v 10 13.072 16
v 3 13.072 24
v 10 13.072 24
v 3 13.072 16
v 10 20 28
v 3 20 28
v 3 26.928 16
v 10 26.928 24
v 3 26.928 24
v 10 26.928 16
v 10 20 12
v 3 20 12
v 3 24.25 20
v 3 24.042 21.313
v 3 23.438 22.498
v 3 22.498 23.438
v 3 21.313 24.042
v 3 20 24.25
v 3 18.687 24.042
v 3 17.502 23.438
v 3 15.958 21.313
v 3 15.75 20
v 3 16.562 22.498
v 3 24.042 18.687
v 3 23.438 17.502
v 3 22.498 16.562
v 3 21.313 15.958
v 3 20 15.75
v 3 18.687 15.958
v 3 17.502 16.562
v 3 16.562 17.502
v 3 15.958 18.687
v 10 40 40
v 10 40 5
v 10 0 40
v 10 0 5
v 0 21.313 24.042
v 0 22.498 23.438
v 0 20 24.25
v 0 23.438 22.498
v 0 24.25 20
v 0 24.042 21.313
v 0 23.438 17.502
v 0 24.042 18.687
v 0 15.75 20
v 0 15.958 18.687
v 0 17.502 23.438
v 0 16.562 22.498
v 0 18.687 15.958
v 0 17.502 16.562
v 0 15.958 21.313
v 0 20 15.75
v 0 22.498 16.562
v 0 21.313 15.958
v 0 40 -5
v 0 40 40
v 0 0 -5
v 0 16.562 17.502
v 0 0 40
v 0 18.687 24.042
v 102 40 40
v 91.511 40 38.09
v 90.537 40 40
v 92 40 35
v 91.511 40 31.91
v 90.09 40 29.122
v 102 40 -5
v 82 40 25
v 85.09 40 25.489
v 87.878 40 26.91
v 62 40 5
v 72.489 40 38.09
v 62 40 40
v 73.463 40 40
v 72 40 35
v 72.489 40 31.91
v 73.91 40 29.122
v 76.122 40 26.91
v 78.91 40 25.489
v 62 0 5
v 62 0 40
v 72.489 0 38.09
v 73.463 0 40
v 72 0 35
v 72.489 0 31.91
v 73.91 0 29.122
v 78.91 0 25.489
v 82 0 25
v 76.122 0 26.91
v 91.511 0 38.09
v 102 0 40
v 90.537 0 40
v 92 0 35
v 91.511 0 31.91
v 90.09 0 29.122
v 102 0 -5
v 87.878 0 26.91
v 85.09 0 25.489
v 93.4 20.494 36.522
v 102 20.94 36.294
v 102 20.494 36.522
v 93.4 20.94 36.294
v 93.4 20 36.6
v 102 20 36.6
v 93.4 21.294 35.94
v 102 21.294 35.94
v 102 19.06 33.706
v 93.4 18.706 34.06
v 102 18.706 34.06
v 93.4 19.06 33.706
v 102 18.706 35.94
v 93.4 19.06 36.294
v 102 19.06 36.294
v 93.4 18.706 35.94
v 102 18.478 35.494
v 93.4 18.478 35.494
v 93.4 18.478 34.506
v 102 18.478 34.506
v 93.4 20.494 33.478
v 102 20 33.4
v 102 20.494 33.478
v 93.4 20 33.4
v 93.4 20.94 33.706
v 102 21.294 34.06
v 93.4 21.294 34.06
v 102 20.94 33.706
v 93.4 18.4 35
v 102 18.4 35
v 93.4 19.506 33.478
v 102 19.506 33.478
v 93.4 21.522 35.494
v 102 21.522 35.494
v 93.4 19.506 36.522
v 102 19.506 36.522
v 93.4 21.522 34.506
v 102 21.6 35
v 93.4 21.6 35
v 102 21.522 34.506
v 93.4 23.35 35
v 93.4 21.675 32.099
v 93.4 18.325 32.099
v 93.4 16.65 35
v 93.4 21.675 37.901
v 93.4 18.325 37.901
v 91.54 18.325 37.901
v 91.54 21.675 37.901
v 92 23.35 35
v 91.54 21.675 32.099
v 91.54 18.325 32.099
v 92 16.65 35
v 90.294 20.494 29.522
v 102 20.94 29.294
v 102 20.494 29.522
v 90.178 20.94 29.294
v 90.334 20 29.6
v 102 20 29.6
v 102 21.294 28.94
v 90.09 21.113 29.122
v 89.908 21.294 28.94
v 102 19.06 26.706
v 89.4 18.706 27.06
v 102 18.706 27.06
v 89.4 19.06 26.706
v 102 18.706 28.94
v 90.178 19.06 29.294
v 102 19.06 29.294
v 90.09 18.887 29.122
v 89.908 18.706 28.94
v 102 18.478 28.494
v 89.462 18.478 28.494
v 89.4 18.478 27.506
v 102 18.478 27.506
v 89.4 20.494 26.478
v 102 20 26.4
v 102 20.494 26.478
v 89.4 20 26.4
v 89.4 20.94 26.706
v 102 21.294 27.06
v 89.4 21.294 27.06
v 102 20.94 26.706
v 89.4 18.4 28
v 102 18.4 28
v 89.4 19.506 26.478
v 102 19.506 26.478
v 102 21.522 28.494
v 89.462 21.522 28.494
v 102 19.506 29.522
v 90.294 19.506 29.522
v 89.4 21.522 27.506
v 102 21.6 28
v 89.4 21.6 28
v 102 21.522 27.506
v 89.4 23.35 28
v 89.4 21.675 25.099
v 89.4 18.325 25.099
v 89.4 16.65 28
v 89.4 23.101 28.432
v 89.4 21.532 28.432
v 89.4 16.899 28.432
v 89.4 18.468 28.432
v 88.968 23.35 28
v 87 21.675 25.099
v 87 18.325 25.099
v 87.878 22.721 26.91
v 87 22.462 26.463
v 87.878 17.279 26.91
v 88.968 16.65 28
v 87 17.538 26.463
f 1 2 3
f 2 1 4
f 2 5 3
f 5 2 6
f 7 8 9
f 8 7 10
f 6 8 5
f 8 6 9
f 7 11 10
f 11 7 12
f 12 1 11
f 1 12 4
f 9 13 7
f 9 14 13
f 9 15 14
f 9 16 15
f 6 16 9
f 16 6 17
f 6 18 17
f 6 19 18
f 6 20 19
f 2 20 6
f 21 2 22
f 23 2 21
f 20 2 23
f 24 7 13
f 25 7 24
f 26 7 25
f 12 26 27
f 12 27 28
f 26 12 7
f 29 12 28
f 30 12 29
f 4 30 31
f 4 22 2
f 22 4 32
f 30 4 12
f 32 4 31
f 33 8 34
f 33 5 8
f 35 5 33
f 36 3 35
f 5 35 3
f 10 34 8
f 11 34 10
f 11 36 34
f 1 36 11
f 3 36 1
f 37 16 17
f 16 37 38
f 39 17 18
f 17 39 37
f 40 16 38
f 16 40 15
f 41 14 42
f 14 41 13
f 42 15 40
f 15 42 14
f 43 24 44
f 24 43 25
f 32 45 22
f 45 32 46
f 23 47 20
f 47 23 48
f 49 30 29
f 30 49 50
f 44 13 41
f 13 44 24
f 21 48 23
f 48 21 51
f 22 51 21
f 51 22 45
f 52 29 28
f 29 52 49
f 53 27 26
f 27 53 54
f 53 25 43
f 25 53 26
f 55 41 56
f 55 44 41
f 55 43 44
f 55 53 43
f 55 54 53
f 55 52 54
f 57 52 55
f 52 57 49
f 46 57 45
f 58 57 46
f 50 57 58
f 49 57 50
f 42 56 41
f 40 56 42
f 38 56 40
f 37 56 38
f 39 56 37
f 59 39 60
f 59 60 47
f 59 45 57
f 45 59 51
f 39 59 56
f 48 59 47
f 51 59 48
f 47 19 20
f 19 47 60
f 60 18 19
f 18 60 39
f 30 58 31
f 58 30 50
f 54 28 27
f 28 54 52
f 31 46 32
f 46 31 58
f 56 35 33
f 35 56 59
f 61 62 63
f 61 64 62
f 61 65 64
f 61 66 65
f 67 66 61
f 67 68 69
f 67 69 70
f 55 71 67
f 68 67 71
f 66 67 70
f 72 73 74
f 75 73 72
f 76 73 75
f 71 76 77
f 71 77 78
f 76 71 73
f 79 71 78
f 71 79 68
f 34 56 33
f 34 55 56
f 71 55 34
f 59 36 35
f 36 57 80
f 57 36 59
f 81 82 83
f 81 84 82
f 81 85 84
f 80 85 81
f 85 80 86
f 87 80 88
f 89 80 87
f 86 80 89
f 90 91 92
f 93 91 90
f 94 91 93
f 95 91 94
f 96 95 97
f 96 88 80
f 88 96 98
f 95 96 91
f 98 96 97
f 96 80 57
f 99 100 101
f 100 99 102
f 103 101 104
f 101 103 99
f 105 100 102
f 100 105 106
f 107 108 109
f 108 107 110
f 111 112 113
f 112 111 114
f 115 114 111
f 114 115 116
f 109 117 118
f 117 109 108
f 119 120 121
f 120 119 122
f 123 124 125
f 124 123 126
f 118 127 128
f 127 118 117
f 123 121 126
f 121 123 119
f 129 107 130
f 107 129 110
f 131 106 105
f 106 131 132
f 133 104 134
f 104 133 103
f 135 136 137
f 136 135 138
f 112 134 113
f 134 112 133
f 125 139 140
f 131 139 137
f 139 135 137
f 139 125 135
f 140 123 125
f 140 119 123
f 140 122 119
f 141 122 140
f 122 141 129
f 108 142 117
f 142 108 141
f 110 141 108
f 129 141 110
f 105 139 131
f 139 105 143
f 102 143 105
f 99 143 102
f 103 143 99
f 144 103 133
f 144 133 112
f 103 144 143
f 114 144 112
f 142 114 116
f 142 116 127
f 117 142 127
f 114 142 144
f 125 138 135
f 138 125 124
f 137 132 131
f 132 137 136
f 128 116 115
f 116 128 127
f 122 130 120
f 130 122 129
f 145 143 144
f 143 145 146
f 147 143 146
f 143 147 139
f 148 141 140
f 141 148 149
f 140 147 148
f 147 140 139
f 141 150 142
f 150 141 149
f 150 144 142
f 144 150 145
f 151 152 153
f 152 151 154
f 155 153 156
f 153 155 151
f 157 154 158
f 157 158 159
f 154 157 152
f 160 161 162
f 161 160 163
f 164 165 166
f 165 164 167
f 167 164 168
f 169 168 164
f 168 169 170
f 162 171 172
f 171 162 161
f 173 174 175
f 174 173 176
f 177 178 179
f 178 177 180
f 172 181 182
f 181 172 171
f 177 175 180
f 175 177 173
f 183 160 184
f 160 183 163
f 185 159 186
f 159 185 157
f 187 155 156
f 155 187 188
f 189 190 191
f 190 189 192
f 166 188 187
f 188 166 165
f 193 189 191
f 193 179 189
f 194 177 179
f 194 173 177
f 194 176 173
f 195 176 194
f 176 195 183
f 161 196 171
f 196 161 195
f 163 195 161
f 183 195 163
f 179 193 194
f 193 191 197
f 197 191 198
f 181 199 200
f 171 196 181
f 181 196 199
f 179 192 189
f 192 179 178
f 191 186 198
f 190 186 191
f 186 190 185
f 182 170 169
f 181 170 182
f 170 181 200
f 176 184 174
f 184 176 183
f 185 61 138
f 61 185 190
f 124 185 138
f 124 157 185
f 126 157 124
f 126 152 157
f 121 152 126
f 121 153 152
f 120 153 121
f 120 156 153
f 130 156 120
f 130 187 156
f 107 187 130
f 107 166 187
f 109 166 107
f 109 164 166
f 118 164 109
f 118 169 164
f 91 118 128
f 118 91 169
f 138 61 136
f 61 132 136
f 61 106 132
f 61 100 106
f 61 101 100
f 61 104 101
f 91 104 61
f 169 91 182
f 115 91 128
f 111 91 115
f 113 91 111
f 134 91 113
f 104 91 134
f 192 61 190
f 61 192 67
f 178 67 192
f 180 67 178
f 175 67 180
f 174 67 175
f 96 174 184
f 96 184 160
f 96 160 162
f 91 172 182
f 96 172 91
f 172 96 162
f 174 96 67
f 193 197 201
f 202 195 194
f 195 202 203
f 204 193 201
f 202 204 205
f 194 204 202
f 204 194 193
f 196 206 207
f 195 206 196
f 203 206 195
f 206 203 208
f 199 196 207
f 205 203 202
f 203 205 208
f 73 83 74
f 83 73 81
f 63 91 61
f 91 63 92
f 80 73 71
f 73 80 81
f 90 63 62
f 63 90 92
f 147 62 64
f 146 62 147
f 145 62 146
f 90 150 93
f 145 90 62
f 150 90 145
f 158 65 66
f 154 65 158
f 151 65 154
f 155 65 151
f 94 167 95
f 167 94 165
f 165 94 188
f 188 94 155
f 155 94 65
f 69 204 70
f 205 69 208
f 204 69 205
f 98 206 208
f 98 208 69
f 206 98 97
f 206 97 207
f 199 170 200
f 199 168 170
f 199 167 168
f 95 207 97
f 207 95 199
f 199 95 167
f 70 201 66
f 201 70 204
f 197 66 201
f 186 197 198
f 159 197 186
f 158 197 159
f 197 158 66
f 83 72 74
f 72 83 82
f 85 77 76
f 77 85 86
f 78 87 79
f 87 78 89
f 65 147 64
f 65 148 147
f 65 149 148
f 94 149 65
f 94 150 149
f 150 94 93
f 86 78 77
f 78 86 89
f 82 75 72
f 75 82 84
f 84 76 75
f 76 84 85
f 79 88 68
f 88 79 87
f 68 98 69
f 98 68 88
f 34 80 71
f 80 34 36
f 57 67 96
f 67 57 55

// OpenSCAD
// file: ../libs/hardware-recess.scad
/*
 * A library to make capture holes in material for M3 & M5 hardware and some
 * common mounting patterns.
 * Copyright 2021 Alex Volkov <alex@flamy.ca>
 *
 * Project URL
 * https://github.com/avolkov/openscad-designs
 *
 * License: Attribution-ShareAlike 4.0 International (CC BY-SA)
 * https://creativecommons.org/licenses/by-sa/4.0/
 *
 * Version 0.1 2021-04-05 Initial publication
 */

 // Common mounting patterns
ear_thick=8;
stacked_len = ear_thick*3;
screw_mount_space = 20;
screw_mount_offset =7;
total_len = stacked_len + screw_mount_space*2;
mounting_diff = 8;


//Globals for hardware diameters
M3_THREAD_RAD = 1.5;
M5_THREAD_RAD = 2.6;


m3_nut_trap_d = 6.7;
m3_nut_thick= 2.4;

//M3 fastener values
m3_bolt_head_d = 5.6;
m3_bolt_thick = 3.2;

//M5 fastener values
m5_nut_thick = 4;
m5_locknut_thick = 5;
nut_trap_d = 9.7;
bolt_head_d = 8.6;
m5_bolt_head_d = bolt_head_d;


module bolt_nut(hole_len, bolt_d, flip=false){
    /*
    Create a model for a hole with bolt end on one end and nut hole on the other end.
    Note, this functions doesn't subtract the model it only makes the model

    :hole_len: total length of the hole
    :bolt_d: diameter of a blot
    :flip: flip the side with bolt recess
    */
    // currently only implemented for 3mm
    if (flip){
        hole_w_end(hole_len, m3_nut_thick, "hex", bolt_d);
        translate([0,0, hole_len]){
            rotate([180, 0, 0]){
                hole_w_end(hole_len, m3_bolt_thick, "round", bolt_d);
            }
        }
    } else {
        hole_w_end(hole_len, m3_bolt_thick, "round", bolt_d);
        translate([0,0, hole_len]){
            rotate([180, 0, 0]){
                hole_w_end(hole_len, m3_nut_thick, "hex", bolt_d);
            }
        }
    }
}


module hole_w_end(hole_len, trap_height, type, bolt_d, flip=false){
    /*
    Make a hole with an end for bolt or a nut.
    This is a more generic functions replacing m5_ hole-making functions.

    :bolt_d: bolt diameter, i.e. 3, 5 mm
    :type: type of the head hole: 'none', 'hex', 'round
    */
    if (type != "none"){
        cylinder(h=hole_len-trap_height, d=bolt_d, $fn=20);
        if (flip){
            m_recess(trap_height, type, bolt_d);
            translate([0,0,trap_height])
                cylinder(h=hole_len-trap_height, d=bolt_d, $fn=20);

        } else {
                translate([0,0, hole_len - trap_height])
                    m_recess(trap_height, type, bolt_d);
        }
    } else {
        cylinder(h=hole_len, d=bolt_d);
    }
}

module m_recess(length, end_type, bolt_d) {
    /*
    Create nut or bolt capture hole

    :height: length of a mounting hole, including end-mounting hardware
    :end_type: type of the head hole: 'none', 'hex', 'round
    :bolt_d: bolt diameter, i.e. 3, 5 mm
    */
    if (bolt_d >= 3 && bolt_d <= 4){
        //M3
        make_recess(length, end_type, m3_nut_trap_d);
    } else if (bolt_d >= 5 && bolt_d <= 6){
        // M5
        make_recess(length, end_type, nut_trap_d);
    }

}

module make_recess(height, end_type, trap_d){
    /*
    Make recess to capture
    */
    rotate([0, 0,90]){
        if (end_type == "hex"){
            cylinder(h=height, d=trap_d, $fn=6);
        } else if (end_type == "round"){
            cylinder(h=height, d=trap_d, $fn=20);
        }
    }
}


//Functions specific to M5 size,
// TODO rewrite as hole_w_end m_recess
module m5_recess(height, end_type) {
    // nut/bolt capture hole
    rotate([0, 0,90]){
        if (end_type == "hex"){
            cylinder(h=height, d=nut_trap_d, $fn=6);
        } else if (end_type == "round"){
            cylinder(h=height, d=nut_trap_d, $fn=20);
        }
    }
}



module m5_hole_w_end(hole_len, trap_height, type){
    //Given hole lenght and trap height create a nut trap hole
    if (type != "none"){
        cylinder(h=hole_len-trap_height, d=5.3, $fn=20); // M5 hole;
            translate([0,0, hole_len-trap_height])
                m5_recess(trap_height, type);
    } else {
        cylinder(h=hole_len, d=5.3); // M5 hole;
    }
}
module m5_hole_w_ends(hole_len, nut_extra=0){
    m5_hole_w_end(hole_len, m5_nut_thick, "round");
    rotate([0, 180, 0])
        translate([0, 0, - hole_len])
            m5_hole_w_end(hole_len, m5_nut_thick + nut_extra, "hex");
}

module m3_hole_w_ends(hole_len, nut_extra=0){
    hole_w_end(hole_len, m3_nut_thick, "round", m3_bolt_thick);
    hole_w_end(hole_len, m3_nut_thick, "hex", m3_bolt_thick, flip=true);
}

module set_mounting_hole(x_offset, y_offset, thickness, nut_height, end_type){
    /*
    Make a hole in an existing material
    end_type: one of hex, round, none
    */
    translate([x_offset, y_offset, 0]){
        m5_hole_w_end(thickness, nut_height, end_type);
    }
}

module m5_thread(height){
    cylinder(h=height, r1=M5_THREAD_RAD, r2=M5_THREAD_RAD, center=true, $fn=16);
}

module m3_thread(height){
    cylinder(h=height, r1=M3_THREAD_RAD, r2=M3_THREAD_RAD, center=true, $fn=16);
}

module m3_square_nut(depth, height){
    translate([0,0,1])
        cylinder(
        h=height, r1=M3_THREAD_RAD, r2=M3_THREAD_RAD, center=true, $fn=16);

    m_recess(m3_nut_thick, "hex",3);
    translate([0,0,-1])
        cylinder(
            h=depth, r1=M3_THREAD_RAD, r2=M3_THREAD_RAD, center=true, $fn=16);
}



//Mounting Patterns

module mounting_holes_2(fastener_len, nut_height, end_type){
    /* Two-hole mounting pattern for M5 bolts*/
    width_offsetn = 16;
    set_mounting_hole(
        screw_mount_offset,
        width_offset + mounting_diff,
        fastener_len,
        nut_height,
        end_type);

    set_mounting_hole(
        total_len - screw_mount_offset,
        width_offset + mounting_diff,
        fastener_len,
        nut_height,
        end_type);


 }

module mounting_holes(fastener_len, nut_height, end_type){
    /*Four-hole mounting pattern for M5 bolts*/
    width_offset = 16;
    set_mounting_hole(
        screw_mount_offset,
        width_offset + mounting_diff,
        fastener_len,
        nut_height,
        end_type);

    set_mounting_hole(
        screw_mount_offset,
        width_offset - mounting_diff,
        fastener_len,
        nut_height,
        end_type);

    // Side towards the end
    set_mounting_hole(
        total_len - screw_mount_offset,
        width_offset + mounting_diff,
        fastener_len,
        nut_height,
        end_type);

    set_mounting_hole(
        total_len - screw_mount_offset,
        width_offset - mounting_diff,
        fastener_len,
        nut_height,
        end_type);
}
// main file
include <../libs/hardware-recess.scad>;

/*
Hook  for curtain holder that attaches to door frame 
Uses M8 bolt to grip door frame

WIP
*/

module u_bracket() {
    union(){
        difference(){ 
            cube([10, 40, 40]);
            translate([10, 20, 20]){
                rotate([0,270,0]){
                    cylinder(d=16, h=7, $fn=6);
                    cylinder(d=8.5, h=10, $fn=20);
                }
            }
        }
        translate([52 + 10, 0, 0])
        difference() {
            cube([40, 40, 40]);
            //TODO: add M3 nut hole for fixing the rail in place
            translate([20, 40, 35]){
                rotate([90, 0, 0]) { 
                    cylinder(h=40, d=20, $fn=20);
                }
            }
            translate([41, 20, 35]){
                rotate([0, 270, 0]){
                    hole_w_end(12, m3_nut_thick, "hex", m3_bolt_thick);
                }
            }
            translate([40, 20, 28]){
                rotate([0, 270, 0]){
                    hole_w_end(15, m3_nut_thick, "hex", m3_bolt_thick);
                }
            }
        }
        translate([0, 0, -5])
            cube([102, 40, 10]);
    }
}


u_bracket();
